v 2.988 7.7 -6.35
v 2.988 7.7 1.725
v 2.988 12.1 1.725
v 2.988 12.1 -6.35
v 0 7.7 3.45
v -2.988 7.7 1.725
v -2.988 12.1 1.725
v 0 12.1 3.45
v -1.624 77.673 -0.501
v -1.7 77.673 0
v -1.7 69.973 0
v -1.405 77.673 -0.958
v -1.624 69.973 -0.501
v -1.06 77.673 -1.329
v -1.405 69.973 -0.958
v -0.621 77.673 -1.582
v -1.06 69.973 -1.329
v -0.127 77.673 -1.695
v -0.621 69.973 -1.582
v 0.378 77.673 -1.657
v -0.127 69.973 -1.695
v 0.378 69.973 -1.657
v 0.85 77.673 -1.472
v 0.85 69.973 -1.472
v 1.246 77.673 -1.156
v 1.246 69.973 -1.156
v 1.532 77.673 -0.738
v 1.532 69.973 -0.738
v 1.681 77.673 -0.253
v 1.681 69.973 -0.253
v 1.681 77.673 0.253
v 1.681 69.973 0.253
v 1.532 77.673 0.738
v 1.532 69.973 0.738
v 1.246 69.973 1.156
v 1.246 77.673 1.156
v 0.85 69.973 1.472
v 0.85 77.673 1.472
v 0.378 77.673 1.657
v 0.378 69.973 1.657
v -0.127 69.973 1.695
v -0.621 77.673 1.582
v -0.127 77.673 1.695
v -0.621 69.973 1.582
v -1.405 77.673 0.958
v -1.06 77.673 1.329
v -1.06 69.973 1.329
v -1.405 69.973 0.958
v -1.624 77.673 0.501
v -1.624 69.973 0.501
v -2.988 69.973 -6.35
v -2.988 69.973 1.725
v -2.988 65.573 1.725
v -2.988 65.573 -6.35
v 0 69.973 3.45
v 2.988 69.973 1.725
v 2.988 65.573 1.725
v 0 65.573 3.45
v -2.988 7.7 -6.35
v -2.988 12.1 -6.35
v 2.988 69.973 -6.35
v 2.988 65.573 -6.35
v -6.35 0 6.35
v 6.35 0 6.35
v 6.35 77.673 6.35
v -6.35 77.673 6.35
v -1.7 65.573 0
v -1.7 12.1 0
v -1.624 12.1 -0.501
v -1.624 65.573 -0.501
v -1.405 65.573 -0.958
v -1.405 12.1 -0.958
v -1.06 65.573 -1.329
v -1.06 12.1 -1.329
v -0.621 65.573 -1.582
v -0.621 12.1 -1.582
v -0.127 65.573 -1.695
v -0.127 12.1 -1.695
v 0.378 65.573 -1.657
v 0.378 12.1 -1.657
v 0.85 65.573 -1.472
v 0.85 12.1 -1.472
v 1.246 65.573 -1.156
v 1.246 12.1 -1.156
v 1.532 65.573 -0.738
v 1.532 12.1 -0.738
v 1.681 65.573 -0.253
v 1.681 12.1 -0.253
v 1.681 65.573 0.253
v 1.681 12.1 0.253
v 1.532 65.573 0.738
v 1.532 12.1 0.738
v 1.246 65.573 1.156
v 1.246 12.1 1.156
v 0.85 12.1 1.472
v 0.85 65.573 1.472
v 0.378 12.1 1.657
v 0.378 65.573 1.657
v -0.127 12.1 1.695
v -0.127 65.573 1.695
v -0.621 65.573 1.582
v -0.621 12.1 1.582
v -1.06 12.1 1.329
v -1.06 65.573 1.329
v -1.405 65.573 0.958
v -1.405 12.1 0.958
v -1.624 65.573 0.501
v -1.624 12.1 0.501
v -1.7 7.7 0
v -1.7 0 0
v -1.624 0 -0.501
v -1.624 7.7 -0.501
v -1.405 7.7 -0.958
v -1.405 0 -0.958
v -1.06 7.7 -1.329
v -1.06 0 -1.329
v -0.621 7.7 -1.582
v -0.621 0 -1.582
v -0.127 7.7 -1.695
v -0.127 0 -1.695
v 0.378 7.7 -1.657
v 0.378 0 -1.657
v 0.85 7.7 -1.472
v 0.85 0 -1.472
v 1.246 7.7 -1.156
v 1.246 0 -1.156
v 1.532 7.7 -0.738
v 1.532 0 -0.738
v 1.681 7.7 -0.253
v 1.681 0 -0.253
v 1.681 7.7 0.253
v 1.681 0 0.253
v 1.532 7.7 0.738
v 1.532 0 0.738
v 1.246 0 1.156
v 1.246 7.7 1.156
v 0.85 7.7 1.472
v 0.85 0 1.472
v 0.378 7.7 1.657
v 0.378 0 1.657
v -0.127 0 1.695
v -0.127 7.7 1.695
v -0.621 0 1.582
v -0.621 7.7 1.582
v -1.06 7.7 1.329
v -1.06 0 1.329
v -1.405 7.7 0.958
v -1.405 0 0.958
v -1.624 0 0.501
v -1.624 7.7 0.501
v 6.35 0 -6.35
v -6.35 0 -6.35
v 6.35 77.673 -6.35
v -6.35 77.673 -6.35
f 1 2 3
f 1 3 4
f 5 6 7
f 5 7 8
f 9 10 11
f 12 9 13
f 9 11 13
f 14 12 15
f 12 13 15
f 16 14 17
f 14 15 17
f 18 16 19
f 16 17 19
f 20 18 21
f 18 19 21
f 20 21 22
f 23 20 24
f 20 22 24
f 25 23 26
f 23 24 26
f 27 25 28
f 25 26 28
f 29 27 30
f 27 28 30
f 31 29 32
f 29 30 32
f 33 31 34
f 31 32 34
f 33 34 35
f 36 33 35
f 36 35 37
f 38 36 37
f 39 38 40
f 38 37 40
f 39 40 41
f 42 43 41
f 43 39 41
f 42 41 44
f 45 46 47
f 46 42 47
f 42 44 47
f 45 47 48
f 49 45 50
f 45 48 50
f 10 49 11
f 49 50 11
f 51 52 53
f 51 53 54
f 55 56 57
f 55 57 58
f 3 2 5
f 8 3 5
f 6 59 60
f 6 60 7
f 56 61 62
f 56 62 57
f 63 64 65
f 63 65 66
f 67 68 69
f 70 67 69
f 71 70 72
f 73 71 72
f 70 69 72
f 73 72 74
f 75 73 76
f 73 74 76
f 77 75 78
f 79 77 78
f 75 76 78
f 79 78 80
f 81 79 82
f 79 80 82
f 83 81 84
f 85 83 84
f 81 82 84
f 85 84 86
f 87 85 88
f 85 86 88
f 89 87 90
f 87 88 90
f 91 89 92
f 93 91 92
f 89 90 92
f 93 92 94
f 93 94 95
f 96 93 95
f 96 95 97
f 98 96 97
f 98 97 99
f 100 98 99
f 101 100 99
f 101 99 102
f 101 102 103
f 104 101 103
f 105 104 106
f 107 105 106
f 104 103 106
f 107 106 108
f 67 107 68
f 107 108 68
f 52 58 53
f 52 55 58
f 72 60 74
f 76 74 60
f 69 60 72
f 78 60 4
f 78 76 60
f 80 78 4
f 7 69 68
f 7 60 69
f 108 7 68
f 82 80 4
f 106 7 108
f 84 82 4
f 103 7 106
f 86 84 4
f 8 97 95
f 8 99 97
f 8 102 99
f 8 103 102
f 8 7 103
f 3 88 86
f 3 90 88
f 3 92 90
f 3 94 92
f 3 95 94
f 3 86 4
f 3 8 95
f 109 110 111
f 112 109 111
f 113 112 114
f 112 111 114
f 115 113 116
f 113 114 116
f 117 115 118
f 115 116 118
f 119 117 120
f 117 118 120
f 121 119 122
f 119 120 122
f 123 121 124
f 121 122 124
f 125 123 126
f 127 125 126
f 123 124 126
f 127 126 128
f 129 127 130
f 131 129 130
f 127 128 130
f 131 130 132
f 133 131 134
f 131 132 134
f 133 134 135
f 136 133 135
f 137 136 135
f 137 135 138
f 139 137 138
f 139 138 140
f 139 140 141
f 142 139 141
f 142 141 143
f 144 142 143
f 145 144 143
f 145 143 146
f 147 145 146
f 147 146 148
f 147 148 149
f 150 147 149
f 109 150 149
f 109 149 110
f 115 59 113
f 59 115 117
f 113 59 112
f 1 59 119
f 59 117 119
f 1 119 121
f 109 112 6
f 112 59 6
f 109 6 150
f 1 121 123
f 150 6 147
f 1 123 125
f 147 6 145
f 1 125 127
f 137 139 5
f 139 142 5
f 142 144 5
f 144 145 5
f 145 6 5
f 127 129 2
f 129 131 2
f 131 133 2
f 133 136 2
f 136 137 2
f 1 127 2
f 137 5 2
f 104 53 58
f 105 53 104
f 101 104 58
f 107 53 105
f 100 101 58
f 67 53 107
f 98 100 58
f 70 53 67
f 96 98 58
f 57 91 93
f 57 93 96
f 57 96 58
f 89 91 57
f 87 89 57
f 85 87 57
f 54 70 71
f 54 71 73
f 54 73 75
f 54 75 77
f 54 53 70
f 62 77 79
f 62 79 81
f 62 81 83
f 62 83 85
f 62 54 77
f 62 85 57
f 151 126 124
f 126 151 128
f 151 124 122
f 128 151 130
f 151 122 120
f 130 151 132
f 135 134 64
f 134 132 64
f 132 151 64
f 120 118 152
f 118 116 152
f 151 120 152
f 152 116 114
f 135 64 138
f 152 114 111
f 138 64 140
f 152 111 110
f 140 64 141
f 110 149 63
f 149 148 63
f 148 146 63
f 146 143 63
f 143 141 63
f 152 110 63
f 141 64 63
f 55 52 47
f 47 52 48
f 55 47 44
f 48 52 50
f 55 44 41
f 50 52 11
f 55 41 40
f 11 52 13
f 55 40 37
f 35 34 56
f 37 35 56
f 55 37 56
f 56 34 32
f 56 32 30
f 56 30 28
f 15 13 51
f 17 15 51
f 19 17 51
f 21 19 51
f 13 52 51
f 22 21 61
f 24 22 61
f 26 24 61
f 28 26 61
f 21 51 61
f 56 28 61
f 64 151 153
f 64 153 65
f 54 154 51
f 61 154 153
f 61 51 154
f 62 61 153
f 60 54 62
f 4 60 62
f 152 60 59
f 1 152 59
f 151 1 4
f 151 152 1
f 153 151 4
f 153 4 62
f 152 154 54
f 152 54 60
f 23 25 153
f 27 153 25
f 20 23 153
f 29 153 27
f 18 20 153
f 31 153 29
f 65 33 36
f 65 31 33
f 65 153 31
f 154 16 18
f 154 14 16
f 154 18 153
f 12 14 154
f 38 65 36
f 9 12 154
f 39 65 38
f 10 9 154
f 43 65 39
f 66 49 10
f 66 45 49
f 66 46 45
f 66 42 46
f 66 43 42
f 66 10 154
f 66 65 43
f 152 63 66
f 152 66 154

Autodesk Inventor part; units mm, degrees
ref_plane "YZ Plane" through (0, 0, 0) normal (1, 0, 0) x (0, 1, 0)
ref_plane "XZ Plane" through (0, 0, 0) normal (0, 1, 0) x (-1, 0, 0)
ref_plane "XY Plane" through (0, 0, 0) normal (0, 0, 1) x (1, 0, 0)
sketch "Sketch1" plane through (0, 0, 0) normal (0, 1, 0) x (-1, 0, 0)
  line L0 (-6.35, 6.35) -> (6.35, 6.35)
  line L1 (6.35, 6.35) -> (6.35, -6.35)
  line L2 (6.35, -6.35) -> (-6.35, -6.35)
  line L3 (-6.35, -6.35) -> (-6.35, 6.35)
  line L4 (-6.35, 6.35) -> (6.35, -6.35) construction
  line L5 (6.35, 6.35) -> (-6.35, -6.35) construction
  circle A0 centre (0, 0) radius 1.7
  dimension "d0" = 12.7
  dimension "d1" = 12.7
  dimension "d2" = 3.4
extrude "Extrusion1" add sketch "Sketch1" along normal blind 77.6732
ref_plane "Work Plane1" through (0, 69.9732, 0) normal (0, 1, 0) x (1, 0, 0)
sketch "Sketch2" plane through (0, 69.9732, 0) normal (0, 1, 0) x (1, 0, 0)
  circle A0 centre (0, 0) radius 1.7 construction
  circle A1 centre (0, 0) radius 3.45 construction
  line L0 (0, -3.45) -> (-2.9878, -1.725)
  line L1 (-2.9878, -1.725) -> (-2.9878, 6.35)
  line L2 (2.9878, 6.35) -> (2.9878, -1.725)
  line L3 (2.9878, -1.725) -> (0, -3.45)
  line L4 (6.35, 6.35) -> (-6.35, 6.35) projected
  line L5 (-2.9878, 6.35) -> (2.9878, 6.35)
  dimension "d6" = 6.9
extrude "Extrusion2" cut sketch "Sketch2" against normal blind 4.4
ref_plane "Work Plane2" through (0, 7.7, 0) normal (0, -1, 0) x (1, 0, 0)
sketch "Sketch3" plane through (0, 7.7, 0) normal (0, -1, 0) x (1, 0, 0)
  circle A0 centre (0, 0) radius 3.45 construction
  line L0 (2.9878, 1.725) -> (0, 3.45) projected
  line L1 (0, 3.45) -> (2.9878, 1.725)
  line L2 (2.9878, 1.725) -> (2.9878, -6.35)
  line L3 (-2.9878, -6.35) -> (-2.9878, 1.725)
  line L4 (-2.9878, 1.725) -> (0, 3.45)
  line L5 (6.35, -6.35) -> (-6.35, -6.35) projected
  line L6 (-2.9878, -6.35) -> (2.9878, -6.35)
  dimension "d10" = 6.9
extrude "Extrusion3" cut sketch "Sketch3" against normal blind 4.4
properties part number "standoff for walls"
